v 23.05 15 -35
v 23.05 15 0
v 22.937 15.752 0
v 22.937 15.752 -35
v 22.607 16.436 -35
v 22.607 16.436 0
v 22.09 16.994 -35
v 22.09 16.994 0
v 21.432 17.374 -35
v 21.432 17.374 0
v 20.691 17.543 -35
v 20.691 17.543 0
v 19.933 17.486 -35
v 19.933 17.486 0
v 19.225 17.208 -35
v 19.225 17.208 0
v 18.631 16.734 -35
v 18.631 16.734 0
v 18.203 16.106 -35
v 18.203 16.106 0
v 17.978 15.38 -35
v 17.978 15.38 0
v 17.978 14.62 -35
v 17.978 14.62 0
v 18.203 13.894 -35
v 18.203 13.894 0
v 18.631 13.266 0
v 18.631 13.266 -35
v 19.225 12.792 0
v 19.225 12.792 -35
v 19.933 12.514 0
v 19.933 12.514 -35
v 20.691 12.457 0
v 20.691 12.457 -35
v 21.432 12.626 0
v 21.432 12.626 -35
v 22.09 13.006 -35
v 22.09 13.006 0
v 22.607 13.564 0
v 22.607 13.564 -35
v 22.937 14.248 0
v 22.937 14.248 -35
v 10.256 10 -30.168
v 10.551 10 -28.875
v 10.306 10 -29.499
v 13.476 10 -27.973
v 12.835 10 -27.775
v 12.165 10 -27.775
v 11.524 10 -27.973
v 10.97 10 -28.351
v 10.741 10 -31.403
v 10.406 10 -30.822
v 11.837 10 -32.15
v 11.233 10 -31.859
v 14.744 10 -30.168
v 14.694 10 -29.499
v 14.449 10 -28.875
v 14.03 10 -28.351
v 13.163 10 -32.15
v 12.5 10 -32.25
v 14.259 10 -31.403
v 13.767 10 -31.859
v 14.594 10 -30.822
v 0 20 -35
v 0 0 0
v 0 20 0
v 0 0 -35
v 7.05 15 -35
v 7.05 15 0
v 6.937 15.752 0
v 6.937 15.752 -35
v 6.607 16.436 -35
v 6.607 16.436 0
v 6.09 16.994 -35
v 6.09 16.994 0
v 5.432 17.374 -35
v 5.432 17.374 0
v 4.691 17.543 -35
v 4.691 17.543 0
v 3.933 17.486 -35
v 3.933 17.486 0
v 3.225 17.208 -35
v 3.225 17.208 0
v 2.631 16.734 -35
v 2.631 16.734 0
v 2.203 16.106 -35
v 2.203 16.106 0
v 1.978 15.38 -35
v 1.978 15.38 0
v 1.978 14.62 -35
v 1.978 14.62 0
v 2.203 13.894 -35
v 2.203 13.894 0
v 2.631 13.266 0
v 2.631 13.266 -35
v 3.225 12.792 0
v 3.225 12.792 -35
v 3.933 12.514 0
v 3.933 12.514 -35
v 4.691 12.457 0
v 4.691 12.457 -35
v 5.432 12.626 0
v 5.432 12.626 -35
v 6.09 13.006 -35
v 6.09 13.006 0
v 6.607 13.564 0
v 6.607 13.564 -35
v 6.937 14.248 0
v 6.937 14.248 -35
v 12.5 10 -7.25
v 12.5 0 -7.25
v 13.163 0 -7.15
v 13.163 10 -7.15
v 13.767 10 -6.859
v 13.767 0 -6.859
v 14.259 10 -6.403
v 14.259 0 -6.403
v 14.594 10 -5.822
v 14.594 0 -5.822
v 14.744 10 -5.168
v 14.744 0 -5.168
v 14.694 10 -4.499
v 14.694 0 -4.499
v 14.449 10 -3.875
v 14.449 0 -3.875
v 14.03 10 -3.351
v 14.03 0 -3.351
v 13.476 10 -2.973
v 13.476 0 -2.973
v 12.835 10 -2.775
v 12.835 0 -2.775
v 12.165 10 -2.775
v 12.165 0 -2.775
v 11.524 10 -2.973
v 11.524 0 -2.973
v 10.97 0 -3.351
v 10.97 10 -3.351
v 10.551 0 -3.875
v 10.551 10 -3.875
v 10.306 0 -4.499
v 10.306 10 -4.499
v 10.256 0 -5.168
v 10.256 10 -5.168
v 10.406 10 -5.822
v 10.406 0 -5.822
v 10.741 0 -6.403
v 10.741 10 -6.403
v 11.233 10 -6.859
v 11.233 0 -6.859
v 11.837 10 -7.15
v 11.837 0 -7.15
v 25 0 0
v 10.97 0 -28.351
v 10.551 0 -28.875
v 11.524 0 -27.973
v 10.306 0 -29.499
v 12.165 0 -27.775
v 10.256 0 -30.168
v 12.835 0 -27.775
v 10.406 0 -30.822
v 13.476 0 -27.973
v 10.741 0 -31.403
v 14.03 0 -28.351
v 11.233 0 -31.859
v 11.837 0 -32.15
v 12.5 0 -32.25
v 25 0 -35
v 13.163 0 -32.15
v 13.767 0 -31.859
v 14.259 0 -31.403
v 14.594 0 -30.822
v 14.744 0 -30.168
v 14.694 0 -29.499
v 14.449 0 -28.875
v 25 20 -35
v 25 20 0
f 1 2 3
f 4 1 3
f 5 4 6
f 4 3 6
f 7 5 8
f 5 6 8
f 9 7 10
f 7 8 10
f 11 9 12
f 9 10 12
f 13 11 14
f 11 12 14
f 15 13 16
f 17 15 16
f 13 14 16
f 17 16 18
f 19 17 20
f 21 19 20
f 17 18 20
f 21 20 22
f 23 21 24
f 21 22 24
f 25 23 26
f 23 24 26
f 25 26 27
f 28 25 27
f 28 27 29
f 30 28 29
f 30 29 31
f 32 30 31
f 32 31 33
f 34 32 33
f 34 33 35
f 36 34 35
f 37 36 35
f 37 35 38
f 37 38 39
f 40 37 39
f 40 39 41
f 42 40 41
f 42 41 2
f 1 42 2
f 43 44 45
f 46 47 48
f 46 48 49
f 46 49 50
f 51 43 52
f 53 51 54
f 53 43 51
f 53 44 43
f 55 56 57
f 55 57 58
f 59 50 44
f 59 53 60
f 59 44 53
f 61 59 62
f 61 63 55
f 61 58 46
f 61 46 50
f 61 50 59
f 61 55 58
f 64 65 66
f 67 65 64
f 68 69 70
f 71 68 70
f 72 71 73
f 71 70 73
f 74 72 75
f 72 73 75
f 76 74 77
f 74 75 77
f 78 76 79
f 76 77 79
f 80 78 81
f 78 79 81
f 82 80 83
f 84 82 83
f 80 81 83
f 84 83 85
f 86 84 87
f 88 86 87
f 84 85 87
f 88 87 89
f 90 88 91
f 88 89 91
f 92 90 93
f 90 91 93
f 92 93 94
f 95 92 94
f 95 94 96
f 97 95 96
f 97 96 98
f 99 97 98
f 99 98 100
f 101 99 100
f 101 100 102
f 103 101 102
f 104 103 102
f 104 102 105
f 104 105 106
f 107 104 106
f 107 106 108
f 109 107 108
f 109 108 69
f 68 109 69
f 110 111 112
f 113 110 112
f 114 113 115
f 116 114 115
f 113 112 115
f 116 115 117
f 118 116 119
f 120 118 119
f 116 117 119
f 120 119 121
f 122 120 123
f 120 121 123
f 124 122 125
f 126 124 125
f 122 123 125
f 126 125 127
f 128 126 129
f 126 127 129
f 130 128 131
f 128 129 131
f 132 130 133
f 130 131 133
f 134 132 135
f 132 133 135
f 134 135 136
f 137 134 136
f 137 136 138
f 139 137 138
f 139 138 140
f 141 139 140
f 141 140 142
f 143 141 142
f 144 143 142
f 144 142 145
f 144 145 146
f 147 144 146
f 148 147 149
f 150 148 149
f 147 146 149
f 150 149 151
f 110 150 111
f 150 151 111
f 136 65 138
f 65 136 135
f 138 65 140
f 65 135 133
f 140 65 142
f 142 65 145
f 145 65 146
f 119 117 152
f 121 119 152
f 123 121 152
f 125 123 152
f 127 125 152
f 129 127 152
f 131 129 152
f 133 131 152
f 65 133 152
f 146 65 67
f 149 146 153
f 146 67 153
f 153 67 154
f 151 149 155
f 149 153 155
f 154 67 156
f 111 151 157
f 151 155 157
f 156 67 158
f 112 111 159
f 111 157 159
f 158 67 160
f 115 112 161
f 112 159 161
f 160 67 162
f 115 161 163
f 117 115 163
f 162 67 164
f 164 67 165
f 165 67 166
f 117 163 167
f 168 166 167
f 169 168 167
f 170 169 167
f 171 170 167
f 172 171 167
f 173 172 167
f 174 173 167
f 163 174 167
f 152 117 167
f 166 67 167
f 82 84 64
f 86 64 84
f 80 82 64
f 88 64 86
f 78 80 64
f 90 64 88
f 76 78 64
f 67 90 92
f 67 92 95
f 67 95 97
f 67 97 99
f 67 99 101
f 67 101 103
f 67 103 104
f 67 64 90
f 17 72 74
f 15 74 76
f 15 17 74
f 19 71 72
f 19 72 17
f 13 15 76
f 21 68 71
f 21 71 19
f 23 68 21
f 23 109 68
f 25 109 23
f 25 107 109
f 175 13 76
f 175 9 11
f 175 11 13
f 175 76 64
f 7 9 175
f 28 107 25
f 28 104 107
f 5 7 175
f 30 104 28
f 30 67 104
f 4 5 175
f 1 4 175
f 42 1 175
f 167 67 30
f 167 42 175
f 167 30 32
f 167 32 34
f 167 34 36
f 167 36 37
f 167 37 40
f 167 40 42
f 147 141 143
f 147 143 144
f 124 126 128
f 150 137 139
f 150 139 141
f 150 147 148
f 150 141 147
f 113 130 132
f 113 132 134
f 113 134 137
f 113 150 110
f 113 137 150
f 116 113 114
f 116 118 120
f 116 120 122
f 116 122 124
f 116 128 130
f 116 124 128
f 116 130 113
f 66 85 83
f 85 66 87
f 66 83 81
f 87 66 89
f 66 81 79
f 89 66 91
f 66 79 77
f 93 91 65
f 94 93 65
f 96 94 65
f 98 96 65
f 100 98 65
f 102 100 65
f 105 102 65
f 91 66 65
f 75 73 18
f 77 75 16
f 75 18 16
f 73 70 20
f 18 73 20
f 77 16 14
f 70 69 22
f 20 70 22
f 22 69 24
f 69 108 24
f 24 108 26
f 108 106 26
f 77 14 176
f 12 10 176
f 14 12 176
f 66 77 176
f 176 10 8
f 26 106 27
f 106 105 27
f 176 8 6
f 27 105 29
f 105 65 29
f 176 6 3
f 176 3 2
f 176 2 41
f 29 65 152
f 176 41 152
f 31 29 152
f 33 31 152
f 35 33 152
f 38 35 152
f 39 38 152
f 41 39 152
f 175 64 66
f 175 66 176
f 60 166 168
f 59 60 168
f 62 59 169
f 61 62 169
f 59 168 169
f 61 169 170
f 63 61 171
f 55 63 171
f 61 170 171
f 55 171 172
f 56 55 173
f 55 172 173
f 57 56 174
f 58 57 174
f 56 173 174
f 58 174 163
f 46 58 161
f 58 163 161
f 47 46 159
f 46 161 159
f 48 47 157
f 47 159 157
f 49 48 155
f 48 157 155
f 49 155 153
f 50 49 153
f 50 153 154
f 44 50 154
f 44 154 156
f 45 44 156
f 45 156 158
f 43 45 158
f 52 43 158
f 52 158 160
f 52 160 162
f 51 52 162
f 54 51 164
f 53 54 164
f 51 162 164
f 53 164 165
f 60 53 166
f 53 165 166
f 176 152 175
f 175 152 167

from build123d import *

# Parameters (mm, degrees)
SKETCH1_W           = 25
SKETCH1_H           = 35
BOSS_EXTRUDE1_DEPTH = 20
SKETCH3_R           = 2.55
CUT_EXTRUDE2_DEPTH  = 48.434164903
SKETCH4_R           = 2.25
CUT_EXTRUDE3_DEPTH  = 10


with BuildPart() as part:
    # Sketch1 → Boss-Extrude1 (new body)
    with BuildSketch(Plane(origin=(0, 0, 0), x_dir=(1, 0, 0), z_dir=(0, 1, 0))):
        with Locations((12.5, 17.5)):
            Rectangle(SKETCH1_W, SKETCH1_H)
    extrude(amount=BOSS_EXTRUDE1_DEPTH)

    # Sketch3 → Cut-Extrude2 (cut, through all)
    with BuildSketch(Plane.XY):
        with Locations((4.5, 15)):
            Circle(SKETCH3_R)
        with Locations((20.5, 15)):
            Circle(SKETCH3_R)
    extrude(amount=-CUT_EXTRUDE2_DEPTH, mode=Mode.SUBTRACT)

    # Sketch4 → Cut-Extrude3 (cut)
    with BuildSketch(Plane.XZ):
        with Locations(Location((12.5, -5, 0), (0, 0, 270))):
            Circle(SKETCH4_R)
        with Locations(Location((12.5, -30, 0), (0, 0, 270))):
            Circle(SKETCH4_R)
    extrude(amount=-CUT_EXTRUDE3_DEPTH, mode=Mode.SUBTRACT)


solid = part.part
